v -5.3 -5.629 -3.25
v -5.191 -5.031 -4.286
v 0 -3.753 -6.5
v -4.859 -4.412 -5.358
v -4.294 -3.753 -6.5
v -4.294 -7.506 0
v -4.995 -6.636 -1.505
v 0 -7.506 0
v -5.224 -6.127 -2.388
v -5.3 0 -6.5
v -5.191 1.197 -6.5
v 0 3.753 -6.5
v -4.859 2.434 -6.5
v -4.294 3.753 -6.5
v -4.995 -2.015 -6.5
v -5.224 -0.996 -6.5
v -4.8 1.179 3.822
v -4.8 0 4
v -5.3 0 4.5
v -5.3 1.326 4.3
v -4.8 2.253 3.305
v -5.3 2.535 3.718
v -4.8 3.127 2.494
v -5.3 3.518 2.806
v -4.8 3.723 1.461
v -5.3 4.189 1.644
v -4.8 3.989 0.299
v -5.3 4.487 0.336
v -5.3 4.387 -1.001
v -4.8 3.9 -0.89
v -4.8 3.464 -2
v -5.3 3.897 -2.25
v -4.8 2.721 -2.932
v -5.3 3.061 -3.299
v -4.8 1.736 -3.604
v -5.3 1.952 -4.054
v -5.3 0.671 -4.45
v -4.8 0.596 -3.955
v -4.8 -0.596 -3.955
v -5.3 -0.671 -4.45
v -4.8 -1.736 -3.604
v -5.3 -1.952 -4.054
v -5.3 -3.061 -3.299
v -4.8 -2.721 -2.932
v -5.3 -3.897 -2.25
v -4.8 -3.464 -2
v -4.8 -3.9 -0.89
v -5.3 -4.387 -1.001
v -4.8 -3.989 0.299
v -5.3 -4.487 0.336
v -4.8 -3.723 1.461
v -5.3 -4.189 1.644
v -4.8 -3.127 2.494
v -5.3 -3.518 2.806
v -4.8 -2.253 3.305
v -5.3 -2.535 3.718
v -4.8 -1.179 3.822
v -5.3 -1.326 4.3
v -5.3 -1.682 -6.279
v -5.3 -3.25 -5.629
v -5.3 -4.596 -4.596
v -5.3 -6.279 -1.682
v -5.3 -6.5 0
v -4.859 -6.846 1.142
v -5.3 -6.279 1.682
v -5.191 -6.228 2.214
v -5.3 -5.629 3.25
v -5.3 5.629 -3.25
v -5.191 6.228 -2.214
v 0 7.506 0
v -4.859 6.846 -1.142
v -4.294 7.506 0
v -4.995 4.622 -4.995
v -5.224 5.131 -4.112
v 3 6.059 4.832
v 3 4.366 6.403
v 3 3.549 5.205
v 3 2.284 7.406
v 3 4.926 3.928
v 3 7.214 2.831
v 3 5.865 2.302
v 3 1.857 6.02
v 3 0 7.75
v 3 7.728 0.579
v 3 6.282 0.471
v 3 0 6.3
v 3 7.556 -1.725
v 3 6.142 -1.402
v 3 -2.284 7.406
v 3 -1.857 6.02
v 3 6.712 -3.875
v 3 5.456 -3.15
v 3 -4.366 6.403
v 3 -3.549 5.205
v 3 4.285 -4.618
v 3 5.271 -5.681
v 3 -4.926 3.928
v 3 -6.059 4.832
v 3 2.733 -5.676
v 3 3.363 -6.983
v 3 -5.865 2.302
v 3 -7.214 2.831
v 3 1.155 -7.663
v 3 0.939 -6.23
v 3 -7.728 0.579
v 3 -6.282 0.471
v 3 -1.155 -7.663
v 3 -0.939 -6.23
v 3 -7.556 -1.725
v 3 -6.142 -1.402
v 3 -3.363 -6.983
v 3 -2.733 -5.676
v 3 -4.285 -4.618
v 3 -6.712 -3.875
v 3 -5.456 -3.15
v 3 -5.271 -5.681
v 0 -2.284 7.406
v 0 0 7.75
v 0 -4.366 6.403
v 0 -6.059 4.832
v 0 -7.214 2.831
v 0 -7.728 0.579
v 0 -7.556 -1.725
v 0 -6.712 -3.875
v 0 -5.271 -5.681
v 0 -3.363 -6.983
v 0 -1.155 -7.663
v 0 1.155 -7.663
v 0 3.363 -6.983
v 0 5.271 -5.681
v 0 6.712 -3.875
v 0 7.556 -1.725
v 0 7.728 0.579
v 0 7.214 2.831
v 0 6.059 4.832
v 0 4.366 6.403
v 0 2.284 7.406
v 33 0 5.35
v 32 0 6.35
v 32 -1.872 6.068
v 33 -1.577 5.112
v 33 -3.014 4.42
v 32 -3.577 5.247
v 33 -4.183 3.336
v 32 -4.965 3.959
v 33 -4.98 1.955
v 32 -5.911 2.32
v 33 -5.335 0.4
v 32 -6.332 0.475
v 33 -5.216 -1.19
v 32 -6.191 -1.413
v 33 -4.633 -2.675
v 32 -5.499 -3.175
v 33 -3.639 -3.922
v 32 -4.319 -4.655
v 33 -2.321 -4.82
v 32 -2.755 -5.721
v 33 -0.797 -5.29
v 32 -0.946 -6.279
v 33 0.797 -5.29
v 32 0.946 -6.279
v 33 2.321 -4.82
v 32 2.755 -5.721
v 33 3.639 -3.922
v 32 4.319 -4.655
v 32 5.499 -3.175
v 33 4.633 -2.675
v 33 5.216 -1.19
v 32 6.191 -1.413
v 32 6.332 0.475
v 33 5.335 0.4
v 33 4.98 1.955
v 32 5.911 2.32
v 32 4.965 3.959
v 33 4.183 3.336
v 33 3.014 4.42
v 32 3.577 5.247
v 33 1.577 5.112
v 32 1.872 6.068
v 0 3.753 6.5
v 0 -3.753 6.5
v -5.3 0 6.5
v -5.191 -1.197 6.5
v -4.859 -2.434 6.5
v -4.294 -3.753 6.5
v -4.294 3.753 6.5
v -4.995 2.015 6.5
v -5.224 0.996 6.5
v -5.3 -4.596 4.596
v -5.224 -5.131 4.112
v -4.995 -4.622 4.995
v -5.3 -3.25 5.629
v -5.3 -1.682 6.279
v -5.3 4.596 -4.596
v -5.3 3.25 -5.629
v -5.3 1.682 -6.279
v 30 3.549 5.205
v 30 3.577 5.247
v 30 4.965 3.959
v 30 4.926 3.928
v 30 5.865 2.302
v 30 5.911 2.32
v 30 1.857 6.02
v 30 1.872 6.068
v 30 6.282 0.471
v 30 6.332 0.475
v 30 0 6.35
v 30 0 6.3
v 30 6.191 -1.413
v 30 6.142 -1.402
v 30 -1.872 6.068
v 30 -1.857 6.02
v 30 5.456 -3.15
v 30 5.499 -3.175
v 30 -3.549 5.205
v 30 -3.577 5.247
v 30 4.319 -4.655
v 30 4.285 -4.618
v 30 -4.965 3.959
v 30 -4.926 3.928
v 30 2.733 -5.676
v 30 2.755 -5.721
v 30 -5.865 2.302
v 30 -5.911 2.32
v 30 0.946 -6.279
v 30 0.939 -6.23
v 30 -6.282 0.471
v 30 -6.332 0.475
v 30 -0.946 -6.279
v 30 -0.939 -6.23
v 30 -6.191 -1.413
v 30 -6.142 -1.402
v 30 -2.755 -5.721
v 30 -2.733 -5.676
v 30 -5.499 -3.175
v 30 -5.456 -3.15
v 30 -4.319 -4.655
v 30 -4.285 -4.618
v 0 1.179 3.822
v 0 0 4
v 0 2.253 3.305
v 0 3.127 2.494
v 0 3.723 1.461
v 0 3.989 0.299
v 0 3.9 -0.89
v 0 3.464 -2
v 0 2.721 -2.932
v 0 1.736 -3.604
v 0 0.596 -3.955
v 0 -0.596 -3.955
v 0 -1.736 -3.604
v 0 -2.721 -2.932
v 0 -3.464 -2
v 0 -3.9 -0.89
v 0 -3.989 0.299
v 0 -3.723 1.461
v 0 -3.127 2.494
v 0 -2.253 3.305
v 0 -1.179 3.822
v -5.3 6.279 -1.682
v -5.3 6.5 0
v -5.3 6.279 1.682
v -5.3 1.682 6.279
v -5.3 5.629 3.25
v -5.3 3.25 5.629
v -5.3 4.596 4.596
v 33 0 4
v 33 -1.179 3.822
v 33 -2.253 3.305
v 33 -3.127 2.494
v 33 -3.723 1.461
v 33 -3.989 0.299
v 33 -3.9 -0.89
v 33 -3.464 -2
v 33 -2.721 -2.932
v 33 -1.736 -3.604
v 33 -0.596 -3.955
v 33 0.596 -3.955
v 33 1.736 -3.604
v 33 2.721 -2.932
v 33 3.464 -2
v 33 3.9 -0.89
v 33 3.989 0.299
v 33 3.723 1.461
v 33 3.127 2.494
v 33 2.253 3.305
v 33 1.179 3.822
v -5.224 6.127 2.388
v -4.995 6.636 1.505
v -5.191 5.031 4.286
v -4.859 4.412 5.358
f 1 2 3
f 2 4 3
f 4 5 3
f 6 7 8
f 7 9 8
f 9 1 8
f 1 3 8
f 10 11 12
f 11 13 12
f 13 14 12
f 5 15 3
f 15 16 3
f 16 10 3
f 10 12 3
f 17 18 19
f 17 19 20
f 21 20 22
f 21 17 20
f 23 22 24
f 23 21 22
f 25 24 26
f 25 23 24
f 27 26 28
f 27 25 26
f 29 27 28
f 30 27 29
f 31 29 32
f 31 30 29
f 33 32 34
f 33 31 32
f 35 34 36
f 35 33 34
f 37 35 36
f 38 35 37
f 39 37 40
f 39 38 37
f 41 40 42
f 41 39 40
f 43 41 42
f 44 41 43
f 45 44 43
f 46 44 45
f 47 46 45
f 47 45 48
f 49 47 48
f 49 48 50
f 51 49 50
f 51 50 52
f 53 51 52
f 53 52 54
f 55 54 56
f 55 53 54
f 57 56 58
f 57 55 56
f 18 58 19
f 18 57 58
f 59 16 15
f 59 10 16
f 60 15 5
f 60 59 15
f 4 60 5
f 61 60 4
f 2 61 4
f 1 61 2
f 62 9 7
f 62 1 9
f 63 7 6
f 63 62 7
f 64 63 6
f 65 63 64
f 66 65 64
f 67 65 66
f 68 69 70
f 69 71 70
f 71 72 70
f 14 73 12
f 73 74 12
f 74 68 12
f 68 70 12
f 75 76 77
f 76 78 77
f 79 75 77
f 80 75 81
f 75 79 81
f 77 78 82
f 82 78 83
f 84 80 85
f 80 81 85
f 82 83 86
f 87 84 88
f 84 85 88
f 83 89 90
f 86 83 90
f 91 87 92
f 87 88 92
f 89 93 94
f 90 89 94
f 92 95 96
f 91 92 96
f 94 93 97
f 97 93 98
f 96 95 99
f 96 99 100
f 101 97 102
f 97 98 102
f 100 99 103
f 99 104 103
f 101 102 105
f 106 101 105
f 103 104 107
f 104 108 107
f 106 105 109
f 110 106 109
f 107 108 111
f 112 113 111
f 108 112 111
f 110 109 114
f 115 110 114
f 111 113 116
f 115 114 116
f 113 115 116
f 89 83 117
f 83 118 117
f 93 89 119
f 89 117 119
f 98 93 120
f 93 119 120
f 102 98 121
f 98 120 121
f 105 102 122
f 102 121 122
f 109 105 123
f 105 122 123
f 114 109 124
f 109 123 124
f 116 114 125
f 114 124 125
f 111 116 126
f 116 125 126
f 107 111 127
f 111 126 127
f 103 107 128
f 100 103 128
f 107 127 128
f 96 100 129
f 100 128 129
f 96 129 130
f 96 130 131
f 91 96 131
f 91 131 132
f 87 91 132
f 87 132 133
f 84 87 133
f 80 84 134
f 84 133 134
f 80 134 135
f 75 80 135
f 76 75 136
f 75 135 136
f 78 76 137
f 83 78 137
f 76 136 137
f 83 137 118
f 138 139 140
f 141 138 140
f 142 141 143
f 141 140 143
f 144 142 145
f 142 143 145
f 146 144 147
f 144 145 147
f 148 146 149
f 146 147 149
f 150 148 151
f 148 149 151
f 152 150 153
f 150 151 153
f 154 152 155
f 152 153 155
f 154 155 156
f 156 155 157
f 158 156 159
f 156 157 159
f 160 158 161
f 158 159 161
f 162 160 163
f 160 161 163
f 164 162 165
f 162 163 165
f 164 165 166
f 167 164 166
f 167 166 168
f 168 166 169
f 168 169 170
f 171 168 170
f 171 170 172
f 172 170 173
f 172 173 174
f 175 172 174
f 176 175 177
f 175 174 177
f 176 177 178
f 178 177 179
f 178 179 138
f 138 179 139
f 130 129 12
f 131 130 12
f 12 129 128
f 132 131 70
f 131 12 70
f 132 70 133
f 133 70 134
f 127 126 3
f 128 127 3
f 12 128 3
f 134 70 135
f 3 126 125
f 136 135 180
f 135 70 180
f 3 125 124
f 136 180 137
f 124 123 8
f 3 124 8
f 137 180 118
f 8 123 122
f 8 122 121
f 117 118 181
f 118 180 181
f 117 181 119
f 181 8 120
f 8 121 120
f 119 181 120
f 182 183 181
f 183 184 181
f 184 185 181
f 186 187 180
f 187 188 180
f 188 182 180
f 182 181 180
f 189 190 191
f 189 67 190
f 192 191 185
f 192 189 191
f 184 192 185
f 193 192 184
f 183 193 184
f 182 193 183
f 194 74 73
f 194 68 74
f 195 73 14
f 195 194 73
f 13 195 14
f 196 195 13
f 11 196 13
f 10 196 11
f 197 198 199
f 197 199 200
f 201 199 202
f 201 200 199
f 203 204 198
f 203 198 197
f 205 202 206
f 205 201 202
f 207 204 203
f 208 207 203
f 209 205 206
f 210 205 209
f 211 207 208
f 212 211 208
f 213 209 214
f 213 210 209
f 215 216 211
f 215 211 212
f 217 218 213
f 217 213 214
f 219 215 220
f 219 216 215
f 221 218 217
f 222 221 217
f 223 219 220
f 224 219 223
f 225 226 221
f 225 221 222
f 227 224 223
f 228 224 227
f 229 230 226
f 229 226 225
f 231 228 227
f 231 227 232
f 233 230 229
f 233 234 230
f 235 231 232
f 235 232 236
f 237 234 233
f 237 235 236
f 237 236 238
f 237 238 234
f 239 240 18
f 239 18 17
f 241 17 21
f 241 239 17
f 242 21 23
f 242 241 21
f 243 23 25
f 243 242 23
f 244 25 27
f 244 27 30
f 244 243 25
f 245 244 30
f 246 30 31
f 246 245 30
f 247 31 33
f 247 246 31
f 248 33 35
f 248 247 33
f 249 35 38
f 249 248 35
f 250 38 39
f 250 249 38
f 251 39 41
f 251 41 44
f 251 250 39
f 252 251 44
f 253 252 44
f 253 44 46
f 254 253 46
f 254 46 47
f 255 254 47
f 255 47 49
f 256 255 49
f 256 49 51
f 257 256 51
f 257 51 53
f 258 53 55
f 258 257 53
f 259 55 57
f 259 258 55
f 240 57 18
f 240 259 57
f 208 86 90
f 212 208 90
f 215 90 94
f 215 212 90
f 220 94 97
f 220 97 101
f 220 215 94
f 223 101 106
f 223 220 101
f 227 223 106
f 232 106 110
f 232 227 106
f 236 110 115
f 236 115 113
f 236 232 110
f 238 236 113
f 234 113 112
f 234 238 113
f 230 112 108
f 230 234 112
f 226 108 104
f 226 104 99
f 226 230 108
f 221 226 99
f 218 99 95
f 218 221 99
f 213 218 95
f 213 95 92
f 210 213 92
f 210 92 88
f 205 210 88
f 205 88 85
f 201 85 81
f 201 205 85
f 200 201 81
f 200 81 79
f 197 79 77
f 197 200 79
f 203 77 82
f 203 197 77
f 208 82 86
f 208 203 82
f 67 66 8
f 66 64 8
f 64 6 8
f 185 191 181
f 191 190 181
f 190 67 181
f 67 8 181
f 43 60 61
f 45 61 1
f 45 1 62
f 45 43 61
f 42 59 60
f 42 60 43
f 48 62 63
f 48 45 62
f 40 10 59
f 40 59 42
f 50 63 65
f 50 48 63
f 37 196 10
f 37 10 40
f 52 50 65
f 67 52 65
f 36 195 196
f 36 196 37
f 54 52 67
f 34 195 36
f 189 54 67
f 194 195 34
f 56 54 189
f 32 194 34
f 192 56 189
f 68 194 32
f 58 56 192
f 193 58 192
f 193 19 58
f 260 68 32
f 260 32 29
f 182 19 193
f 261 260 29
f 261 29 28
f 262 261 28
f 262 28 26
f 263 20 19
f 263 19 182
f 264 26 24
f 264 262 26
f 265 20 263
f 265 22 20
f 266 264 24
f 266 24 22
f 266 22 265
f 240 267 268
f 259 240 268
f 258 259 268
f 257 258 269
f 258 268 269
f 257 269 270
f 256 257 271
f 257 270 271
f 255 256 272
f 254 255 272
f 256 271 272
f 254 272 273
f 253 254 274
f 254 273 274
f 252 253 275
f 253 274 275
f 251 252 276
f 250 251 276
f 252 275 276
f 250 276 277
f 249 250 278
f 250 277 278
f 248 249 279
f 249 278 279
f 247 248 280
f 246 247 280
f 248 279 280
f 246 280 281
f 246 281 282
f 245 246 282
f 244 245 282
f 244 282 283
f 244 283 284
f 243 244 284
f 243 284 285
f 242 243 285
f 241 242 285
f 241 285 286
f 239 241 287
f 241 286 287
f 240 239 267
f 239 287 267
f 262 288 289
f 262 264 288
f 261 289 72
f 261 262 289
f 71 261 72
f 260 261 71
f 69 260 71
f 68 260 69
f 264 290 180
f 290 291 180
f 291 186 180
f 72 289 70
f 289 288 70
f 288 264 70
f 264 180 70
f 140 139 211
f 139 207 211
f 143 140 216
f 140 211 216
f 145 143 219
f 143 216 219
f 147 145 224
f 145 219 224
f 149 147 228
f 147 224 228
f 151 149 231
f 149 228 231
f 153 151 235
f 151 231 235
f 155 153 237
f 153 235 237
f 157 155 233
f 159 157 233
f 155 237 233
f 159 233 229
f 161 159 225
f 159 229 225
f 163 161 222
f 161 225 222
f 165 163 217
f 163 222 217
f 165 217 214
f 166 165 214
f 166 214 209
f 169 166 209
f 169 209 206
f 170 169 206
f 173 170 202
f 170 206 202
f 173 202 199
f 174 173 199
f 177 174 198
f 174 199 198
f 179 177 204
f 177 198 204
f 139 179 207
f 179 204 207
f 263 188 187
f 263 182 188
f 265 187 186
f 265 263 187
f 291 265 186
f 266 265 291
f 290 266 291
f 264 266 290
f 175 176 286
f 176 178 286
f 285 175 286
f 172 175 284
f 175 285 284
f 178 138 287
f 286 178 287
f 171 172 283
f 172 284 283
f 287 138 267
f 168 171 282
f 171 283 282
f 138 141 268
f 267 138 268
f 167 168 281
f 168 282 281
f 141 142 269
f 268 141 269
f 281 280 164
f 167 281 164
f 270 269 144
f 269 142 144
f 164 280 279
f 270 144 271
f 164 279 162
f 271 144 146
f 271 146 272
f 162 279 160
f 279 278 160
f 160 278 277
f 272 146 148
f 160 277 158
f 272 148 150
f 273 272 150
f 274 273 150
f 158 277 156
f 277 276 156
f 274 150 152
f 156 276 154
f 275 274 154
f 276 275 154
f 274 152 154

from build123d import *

# Parameters (mm, degrees)
SFAZOWANIE2_SIZE            = 1
SZKIC2_W                    = 27
SZKIC2_H                    = 0.05
SZKIC3_R                    = 4
DODANIE_WYCI_GNI_CIE1_DEPTH = 5.3
SFAZOWANIE3_SIZE            = 0.5


with BuildPart() as part:
    # Szkic1 → Obrót1 (revolve)
    with BuildSketch(Plane.XY, mode=Mode.PRIVATE) as obr_t1_sk:
        Polygon((0, 4), (33, 4), (33, 6.35), (3, 6.35), (3, 7.75), (0, 7.75), align=None)
    revolve(obr_t1_sk.sketch.rotate(Axis((0, 0, 0), (1, 0, 0)), 90), axis=Axis((0, 0, 0), (1, 0, 0)))

    # Sfazowanie2
    sfazowanie2_edges = [part.edges().sort_by_distance(p)[0] for p in [
        (33, 0, -6.35),
    ]]
    chamfer(sfazowanie2_edges, length=SFAZOWANIE2_SIZE)

    # Szkic2 → Wycięcie-obrót1 (revolve, cut)
    with BuildSketch(Plane.XY, mode=Mode.PRIVATE) as wyci_cie_obr_t1_sk:
        with Locations((16.5, 6.325)):
            Rectangle(SZKIC2_W, SZKIC2_H)
    revolve(wyci_cie_obr_t1_sk.sketch.rotate(Axis((3, 0, 0), (1, 0, 0)), 90), axis=Axis((3, 0, 0), (1, 0, 0)), mode=Mode.SUBTRACT)

    # Szkic3 → Dodanie-wyciągnięcie1 (add)
    with BuildSketch(Plane.ZY):
        Polygon((6.5, -3.75277675), (6.5, 3.75277675), (0, 7.505553499), (-6.5, 3.75277675), (-6.5, -3.75277675), (0, -7.505553499), align=None)
        Circle(SZKIC3_R, mode=Mode.SUBTRACT)
    extrude(amount=DODANIE_WYCI_GNI_CIE1_DEPTH)

    # Szkic4 → Wycięcie-obrót2 (revolve, cut)
    with BuildSketch(Plane(origin=(0, 0, 0), x_dir=(1, 0, 0), z_dir=(0, 1, 0)), mode=Mode.PRIVATE) as wyci_cie_obr_t2_sk:
        Polygon((-5.3, 6.5), (-5.3, 10), (-1.8, 10), align=None)
    revolve(wyci_cie_obr_t2_sk.sketch.rotate(Axis((0, 0, 0), (-1, 0, 0)), 180), axis=Axis((0, 0, 0), (-1, 0, 0)), mode=Mode.SUBTRACT)

    # Sfazowanie3
    sfazowanie3_edges = [part.edges().sort_by_distance(p)[0] for p in [
        (-5.3, 0, -4),
    ]]
    chamfer(sfazowanie3_edges, length=SFAZOWANIE3_SIZE)


solid = part.part
